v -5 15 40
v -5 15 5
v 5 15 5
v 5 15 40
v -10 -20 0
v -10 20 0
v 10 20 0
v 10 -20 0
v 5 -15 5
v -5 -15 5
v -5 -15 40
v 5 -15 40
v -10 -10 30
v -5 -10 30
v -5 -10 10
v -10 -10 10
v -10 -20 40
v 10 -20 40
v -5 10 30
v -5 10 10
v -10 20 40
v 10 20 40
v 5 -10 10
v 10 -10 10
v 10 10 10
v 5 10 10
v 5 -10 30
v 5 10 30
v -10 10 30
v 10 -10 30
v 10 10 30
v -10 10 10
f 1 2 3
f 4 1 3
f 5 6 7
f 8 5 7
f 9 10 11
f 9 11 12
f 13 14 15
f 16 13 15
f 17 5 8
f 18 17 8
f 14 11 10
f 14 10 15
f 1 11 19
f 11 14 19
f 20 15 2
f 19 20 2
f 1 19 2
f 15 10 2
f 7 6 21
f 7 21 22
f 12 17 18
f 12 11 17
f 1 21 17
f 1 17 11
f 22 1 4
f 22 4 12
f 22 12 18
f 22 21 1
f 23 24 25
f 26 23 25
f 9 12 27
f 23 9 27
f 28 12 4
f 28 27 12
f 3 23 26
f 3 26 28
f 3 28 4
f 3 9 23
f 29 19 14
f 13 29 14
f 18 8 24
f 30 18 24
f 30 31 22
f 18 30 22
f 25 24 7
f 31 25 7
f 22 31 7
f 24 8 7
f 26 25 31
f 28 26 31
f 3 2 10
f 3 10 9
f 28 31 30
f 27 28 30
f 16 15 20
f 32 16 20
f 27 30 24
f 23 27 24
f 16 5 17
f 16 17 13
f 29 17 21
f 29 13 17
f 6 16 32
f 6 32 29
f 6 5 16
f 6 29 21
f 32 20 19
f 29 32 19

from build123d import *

# Parameters (mm, degrees)
F0_W     = 20
F0_H     = 40
F0_W_2   = 10
F0_H_2   = 30
F1_DEPTH = 40
F2_DEPTH = 5
F4_DEPTH = 60


with BuildPart() as f1:
    # F0 (on Top) → F1 (new body)
    with BuildSketch(Plane.XY):
        Rectangle(F0_W, F0_H)
        Rectangle(F0_W_2, F0_H_2, mode=Mode.SUBTRACT)
    extrude(amount=F1_DEPTH)

    # F0 (on Top) → F2 (join)
    with BuildSketch(Plane.XY):
        Rectangle(F0_W_2, F0_H_2)
    extrude(amount=F2_DEPTH)

    # F3 (on face) → F4 (cut)
    with BuildSketch(Plane.YZ.offset(10)):
        Polygon((-10, 10), (0, 10), (10, 10), (10, 30), (-10, 30), align=None)
    extrude(amount=-F4_DEPTH, mode=Mode.SUBTRACT)


solid = f1.part
